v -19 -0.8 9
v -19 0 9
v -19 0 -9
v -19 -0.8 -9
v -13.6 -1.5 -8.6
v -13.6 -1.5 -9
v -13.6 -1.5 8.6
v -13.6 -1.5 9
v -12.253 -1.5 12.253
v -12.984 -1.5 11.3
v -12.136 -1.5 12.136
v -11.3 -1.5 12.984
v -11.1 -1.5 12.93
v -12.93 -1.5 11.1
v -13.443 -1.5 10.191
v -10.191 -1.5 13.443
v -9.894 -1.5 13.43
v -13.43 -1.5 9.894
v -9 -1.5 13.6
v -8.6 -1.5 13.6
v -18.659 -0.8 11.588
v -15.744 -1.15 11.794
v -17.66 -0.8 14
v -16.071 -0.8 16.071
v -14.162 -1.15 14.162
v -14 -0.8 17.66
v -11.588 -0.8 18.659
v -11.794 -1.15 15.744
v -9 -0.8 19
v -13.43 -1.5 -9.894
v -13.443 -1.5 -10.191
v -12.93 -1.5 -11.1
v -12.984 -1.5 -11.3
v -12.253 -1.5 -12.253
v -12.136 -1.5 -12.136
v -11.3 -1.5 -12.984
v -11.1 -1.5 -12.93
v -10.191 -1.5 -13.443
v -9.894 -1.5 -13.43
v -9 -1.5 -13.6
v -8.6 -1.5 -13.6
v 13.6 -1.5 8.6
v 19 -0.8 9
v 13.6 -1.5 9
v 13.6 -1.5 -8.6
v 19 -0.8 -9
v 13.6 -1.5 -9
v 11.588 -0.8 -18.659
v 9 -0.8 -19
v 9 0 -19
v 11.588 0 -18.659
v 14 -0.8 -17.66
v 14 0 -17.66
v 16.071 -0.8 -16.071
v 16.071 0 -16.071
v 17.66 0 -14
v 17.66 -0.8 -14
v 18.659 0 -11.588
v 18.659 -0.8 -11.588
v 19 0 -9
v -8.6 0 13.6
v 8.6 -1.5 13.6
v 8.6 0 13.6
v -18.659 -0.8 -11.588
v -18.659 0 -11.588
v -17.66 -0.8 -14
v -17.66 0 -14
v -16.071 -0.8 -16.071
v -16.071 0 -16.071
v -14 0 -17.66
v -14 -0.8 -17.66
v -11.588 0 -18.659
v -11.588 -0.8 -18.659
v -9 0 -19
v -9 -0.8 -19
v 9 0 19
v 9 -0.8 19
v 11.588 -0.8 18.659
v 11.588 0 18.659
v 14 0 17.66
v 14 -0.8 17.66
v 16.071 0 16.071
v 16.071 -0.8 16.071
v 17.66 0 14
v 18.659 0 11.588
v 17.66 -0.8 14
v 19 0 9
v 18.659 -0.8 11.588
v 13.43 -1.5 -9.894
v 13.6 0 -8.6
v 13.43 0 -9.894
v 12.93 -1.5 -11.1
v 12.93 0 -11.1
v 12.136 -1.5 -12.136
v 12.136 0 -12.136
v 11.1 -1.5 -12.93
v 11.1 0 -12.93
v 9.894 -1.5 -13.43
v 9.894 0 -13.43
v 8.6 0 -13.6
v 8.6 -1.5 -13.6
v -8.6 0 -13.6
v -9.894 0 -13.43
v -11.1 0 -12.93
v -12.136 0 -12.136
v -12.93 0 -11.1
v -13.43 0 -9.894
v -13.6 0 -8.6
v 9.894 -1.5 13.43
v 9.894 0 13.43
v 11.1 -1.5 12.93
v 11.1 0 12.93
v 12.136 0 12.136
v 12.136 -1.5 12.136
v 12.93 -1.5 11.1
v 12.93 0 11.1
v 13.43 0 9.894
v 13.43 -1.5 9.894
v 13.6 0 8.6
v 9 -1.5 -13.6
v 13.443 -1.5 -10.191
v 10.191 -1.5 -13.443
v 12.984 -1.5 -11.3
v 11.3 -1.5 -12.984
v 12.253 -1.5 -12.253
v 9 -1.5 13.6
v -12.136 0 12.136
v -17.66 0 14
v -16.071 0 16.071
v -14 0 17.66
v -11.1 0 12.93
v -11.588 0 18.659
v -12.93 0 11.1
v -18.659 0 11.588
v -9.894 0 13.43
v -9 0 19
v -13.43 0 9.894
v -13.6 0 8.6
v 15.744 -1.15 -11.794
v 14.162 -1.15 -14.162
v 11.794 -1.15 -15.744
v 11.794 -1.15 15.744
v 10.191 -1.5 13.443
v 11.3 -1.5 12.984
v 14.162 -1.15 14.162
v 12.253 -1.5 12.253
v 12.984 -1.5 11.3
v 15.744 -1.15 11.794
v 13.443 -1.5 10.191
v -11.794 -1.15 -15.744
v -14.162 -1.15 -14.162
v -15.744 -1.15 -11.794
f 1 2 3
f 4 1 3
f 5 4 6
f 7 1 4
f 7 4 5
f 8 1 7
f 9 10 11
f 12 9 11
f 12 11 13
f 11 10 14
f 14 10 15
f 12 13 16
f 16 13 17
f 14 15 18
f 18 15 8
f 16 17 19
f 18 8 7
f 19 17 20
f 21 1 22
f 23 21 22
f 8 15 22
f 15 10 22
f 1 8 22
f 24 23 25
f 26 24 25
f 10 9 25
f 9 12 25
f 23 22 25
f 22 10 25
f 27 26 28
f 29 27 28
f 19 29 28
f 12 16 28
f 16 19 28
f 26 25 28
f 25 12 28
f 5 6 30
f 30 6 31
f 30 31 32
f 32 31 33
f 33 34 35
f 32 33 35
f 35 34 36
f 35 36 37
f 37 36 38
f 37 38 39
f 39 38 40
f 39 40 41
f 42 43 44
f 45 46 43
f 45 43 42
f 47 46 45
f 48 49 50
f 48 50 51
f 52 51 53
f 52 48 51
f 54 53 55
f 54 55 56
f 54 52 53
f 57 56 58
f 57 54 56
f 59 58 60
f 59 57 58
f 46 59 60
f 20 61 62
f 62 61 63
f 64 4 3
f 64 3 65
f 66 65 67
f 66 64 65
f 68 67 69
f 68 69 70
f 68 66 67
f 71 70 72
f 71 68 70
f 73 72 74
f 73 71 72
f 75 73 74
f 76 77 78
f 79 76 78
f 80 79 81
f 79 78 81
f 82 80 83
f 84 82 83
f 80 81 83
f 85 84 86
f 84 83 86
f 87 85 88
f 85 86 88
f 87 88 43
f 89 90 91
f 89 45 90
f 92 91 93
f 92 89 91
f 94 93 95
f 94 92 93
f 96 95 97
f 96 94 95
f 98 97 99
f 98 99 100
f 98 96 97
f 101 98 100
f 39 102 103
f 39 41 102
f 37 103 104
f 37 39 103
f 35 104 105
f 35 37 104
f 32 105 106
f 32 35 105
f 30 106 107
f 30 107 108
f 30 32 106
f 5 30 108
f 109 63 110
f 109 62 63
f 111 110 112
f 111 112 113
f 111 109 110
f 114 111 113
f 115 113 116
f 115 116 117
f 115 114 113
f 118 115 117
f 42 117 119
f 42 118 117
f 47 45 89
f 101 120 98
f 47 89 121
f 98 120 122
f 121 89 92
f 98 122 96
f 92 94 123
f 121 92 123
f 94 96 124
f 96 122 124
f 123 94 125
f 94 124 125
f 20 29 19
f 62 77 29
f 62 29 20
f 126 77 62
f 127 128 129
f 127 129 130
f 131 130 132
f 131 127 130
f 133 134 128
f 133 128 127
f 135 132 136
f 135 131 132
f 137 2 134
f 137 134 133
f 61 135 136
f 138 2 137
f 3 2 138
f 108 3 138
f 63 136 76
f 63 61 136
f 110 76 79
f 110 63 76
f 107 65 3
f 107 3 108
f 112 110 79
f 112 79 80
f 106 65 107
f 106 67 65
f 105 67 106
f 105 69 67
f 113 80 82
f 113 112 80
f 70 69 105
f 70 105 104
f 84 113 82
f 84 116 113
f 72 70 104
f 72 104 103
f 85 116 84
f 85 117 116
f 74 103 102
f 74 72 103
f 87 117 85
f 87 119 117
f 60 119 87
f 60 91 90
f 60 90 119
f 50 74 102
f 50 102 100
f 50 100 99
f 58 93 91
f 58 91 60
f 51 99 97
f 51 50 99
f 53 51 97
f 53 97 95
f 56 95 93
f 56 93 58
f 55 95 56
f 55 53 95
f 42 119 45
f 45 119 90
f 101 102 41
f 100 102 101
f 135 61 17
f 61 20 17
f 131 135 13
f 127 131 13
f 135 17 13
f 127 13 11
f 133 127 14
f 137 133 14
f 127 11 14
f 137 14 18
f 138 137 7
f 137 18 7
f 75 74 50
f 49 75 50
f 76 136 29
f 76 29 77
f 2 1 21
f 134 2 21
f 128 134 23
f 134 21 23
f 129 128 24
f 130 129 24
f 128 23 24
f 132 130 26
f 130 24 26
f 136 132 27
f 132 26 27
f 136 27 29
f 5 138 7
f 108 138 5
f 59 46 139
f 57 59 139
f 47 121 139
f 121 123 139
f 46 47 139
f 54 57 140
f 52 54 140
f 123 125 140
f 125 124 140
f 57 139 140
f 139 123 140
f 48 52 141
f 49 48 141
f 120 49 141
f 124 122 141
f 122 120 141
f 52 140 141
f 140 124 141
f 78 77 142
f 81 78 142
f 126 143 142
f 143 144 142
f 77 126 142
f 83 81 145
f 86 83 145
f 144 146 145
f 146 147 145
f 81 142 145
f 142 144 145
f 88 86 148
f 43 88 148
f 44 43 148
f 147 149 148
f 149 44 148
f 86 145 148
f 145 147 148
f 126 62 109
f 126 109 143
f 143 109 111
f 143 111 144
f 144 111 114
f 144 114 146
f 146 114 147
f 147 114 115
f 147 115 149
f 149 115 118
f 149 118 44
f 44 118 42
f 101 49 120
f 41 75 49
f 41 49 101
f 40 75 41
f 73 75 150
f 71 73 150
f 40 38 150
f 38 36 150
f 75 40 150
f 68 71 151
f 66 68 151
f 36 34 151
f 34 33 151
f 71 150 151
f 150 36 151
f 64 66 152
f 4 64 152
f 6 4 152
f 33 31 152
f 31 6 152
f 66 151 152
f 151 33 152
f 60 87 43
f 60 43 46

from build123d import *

# Parameters (mm, degrees)
SKETCH1_W      = 38
SKETCH1_H      = 38
SKETCH1_W_2    = 27.2
SKETCH1_H_2    = 27.2
EXTRUDE1_DEPTH = 1.5
FILLET1_R      = 5
FILLET2_R      = 10


with BuildPart() as part:
    # Sketch1 → Extrude1 (new body)
    with BuildSketch(Plane(origin=(0, 0, 0), x_dir=(1, 0, 0), z_dir=(0, 1, 0))):
        Rectangle(SKETCH1_W, SKETCH1_H)
        Rectangle(SKETCH1_W_2, SKETCH1_H_2, mode=Mode.SUBTRACT)
    extrude(amount=-EXTRUDE1_DEPTH)

    # Fillet1
    fillet1_edges = [part.edges().sort_by_distance(p)[0] for p in [
        (-13.6, -0.75, 13.6),
        (-13.6, -0.75, -13.6),
        (13.6, -0.75, -13.6),
        (13.6, -0.75, 13.6),
    ]]
    fillet(fillet1_edges, radius=FILLET1_R)

    # Fillet2
    fillet2_edges = [part.edges().sort_by_distance(p)[0] for p in [
        (-19, -0.75, -19),
        (19, -0.75, -19),
        (19, -0.75, 19),
        (-19, -0.75, 19),
    ]]
    fillet(fillet2_edges, radius=FILLET2_R)

    # Cut-Sweep1: sweep along a path in Sketch4
    with BuildLine(Plane.XZ.offset(1.5)) as cut_sweep1_path:
        Line((9, -19), (-9, -19))
        ThreePointArc((-9, -19), (-16.071067812, -16.071067812), (-19, -9))
        Line((-19, -9), (-19, 9))
        ThreePointArc((-19, 9), (-16.071067812, 16.071067812), (-9, 19))
        Line((-9, 19), (9, 19))
        ThreePointArc((9, 19), (16.071067812, 16.071067812), (19, 9))
        Line((19, 9), (19, -9))
        ThreePointArc((19, -9), (16.071067812, -16.071067812), (9, -19))
    # Sketch2 → Cut-Sweep1 (sweep, cut)
    with BuildSketch(Plane.XY):
        Polygon((19, -0.8), (19, -1.5), (13.6, -1.5), align=None)
    sweep(path=cut_sweep1_path.line, mode=Mode.SUBTRACT)


solid = part.part
